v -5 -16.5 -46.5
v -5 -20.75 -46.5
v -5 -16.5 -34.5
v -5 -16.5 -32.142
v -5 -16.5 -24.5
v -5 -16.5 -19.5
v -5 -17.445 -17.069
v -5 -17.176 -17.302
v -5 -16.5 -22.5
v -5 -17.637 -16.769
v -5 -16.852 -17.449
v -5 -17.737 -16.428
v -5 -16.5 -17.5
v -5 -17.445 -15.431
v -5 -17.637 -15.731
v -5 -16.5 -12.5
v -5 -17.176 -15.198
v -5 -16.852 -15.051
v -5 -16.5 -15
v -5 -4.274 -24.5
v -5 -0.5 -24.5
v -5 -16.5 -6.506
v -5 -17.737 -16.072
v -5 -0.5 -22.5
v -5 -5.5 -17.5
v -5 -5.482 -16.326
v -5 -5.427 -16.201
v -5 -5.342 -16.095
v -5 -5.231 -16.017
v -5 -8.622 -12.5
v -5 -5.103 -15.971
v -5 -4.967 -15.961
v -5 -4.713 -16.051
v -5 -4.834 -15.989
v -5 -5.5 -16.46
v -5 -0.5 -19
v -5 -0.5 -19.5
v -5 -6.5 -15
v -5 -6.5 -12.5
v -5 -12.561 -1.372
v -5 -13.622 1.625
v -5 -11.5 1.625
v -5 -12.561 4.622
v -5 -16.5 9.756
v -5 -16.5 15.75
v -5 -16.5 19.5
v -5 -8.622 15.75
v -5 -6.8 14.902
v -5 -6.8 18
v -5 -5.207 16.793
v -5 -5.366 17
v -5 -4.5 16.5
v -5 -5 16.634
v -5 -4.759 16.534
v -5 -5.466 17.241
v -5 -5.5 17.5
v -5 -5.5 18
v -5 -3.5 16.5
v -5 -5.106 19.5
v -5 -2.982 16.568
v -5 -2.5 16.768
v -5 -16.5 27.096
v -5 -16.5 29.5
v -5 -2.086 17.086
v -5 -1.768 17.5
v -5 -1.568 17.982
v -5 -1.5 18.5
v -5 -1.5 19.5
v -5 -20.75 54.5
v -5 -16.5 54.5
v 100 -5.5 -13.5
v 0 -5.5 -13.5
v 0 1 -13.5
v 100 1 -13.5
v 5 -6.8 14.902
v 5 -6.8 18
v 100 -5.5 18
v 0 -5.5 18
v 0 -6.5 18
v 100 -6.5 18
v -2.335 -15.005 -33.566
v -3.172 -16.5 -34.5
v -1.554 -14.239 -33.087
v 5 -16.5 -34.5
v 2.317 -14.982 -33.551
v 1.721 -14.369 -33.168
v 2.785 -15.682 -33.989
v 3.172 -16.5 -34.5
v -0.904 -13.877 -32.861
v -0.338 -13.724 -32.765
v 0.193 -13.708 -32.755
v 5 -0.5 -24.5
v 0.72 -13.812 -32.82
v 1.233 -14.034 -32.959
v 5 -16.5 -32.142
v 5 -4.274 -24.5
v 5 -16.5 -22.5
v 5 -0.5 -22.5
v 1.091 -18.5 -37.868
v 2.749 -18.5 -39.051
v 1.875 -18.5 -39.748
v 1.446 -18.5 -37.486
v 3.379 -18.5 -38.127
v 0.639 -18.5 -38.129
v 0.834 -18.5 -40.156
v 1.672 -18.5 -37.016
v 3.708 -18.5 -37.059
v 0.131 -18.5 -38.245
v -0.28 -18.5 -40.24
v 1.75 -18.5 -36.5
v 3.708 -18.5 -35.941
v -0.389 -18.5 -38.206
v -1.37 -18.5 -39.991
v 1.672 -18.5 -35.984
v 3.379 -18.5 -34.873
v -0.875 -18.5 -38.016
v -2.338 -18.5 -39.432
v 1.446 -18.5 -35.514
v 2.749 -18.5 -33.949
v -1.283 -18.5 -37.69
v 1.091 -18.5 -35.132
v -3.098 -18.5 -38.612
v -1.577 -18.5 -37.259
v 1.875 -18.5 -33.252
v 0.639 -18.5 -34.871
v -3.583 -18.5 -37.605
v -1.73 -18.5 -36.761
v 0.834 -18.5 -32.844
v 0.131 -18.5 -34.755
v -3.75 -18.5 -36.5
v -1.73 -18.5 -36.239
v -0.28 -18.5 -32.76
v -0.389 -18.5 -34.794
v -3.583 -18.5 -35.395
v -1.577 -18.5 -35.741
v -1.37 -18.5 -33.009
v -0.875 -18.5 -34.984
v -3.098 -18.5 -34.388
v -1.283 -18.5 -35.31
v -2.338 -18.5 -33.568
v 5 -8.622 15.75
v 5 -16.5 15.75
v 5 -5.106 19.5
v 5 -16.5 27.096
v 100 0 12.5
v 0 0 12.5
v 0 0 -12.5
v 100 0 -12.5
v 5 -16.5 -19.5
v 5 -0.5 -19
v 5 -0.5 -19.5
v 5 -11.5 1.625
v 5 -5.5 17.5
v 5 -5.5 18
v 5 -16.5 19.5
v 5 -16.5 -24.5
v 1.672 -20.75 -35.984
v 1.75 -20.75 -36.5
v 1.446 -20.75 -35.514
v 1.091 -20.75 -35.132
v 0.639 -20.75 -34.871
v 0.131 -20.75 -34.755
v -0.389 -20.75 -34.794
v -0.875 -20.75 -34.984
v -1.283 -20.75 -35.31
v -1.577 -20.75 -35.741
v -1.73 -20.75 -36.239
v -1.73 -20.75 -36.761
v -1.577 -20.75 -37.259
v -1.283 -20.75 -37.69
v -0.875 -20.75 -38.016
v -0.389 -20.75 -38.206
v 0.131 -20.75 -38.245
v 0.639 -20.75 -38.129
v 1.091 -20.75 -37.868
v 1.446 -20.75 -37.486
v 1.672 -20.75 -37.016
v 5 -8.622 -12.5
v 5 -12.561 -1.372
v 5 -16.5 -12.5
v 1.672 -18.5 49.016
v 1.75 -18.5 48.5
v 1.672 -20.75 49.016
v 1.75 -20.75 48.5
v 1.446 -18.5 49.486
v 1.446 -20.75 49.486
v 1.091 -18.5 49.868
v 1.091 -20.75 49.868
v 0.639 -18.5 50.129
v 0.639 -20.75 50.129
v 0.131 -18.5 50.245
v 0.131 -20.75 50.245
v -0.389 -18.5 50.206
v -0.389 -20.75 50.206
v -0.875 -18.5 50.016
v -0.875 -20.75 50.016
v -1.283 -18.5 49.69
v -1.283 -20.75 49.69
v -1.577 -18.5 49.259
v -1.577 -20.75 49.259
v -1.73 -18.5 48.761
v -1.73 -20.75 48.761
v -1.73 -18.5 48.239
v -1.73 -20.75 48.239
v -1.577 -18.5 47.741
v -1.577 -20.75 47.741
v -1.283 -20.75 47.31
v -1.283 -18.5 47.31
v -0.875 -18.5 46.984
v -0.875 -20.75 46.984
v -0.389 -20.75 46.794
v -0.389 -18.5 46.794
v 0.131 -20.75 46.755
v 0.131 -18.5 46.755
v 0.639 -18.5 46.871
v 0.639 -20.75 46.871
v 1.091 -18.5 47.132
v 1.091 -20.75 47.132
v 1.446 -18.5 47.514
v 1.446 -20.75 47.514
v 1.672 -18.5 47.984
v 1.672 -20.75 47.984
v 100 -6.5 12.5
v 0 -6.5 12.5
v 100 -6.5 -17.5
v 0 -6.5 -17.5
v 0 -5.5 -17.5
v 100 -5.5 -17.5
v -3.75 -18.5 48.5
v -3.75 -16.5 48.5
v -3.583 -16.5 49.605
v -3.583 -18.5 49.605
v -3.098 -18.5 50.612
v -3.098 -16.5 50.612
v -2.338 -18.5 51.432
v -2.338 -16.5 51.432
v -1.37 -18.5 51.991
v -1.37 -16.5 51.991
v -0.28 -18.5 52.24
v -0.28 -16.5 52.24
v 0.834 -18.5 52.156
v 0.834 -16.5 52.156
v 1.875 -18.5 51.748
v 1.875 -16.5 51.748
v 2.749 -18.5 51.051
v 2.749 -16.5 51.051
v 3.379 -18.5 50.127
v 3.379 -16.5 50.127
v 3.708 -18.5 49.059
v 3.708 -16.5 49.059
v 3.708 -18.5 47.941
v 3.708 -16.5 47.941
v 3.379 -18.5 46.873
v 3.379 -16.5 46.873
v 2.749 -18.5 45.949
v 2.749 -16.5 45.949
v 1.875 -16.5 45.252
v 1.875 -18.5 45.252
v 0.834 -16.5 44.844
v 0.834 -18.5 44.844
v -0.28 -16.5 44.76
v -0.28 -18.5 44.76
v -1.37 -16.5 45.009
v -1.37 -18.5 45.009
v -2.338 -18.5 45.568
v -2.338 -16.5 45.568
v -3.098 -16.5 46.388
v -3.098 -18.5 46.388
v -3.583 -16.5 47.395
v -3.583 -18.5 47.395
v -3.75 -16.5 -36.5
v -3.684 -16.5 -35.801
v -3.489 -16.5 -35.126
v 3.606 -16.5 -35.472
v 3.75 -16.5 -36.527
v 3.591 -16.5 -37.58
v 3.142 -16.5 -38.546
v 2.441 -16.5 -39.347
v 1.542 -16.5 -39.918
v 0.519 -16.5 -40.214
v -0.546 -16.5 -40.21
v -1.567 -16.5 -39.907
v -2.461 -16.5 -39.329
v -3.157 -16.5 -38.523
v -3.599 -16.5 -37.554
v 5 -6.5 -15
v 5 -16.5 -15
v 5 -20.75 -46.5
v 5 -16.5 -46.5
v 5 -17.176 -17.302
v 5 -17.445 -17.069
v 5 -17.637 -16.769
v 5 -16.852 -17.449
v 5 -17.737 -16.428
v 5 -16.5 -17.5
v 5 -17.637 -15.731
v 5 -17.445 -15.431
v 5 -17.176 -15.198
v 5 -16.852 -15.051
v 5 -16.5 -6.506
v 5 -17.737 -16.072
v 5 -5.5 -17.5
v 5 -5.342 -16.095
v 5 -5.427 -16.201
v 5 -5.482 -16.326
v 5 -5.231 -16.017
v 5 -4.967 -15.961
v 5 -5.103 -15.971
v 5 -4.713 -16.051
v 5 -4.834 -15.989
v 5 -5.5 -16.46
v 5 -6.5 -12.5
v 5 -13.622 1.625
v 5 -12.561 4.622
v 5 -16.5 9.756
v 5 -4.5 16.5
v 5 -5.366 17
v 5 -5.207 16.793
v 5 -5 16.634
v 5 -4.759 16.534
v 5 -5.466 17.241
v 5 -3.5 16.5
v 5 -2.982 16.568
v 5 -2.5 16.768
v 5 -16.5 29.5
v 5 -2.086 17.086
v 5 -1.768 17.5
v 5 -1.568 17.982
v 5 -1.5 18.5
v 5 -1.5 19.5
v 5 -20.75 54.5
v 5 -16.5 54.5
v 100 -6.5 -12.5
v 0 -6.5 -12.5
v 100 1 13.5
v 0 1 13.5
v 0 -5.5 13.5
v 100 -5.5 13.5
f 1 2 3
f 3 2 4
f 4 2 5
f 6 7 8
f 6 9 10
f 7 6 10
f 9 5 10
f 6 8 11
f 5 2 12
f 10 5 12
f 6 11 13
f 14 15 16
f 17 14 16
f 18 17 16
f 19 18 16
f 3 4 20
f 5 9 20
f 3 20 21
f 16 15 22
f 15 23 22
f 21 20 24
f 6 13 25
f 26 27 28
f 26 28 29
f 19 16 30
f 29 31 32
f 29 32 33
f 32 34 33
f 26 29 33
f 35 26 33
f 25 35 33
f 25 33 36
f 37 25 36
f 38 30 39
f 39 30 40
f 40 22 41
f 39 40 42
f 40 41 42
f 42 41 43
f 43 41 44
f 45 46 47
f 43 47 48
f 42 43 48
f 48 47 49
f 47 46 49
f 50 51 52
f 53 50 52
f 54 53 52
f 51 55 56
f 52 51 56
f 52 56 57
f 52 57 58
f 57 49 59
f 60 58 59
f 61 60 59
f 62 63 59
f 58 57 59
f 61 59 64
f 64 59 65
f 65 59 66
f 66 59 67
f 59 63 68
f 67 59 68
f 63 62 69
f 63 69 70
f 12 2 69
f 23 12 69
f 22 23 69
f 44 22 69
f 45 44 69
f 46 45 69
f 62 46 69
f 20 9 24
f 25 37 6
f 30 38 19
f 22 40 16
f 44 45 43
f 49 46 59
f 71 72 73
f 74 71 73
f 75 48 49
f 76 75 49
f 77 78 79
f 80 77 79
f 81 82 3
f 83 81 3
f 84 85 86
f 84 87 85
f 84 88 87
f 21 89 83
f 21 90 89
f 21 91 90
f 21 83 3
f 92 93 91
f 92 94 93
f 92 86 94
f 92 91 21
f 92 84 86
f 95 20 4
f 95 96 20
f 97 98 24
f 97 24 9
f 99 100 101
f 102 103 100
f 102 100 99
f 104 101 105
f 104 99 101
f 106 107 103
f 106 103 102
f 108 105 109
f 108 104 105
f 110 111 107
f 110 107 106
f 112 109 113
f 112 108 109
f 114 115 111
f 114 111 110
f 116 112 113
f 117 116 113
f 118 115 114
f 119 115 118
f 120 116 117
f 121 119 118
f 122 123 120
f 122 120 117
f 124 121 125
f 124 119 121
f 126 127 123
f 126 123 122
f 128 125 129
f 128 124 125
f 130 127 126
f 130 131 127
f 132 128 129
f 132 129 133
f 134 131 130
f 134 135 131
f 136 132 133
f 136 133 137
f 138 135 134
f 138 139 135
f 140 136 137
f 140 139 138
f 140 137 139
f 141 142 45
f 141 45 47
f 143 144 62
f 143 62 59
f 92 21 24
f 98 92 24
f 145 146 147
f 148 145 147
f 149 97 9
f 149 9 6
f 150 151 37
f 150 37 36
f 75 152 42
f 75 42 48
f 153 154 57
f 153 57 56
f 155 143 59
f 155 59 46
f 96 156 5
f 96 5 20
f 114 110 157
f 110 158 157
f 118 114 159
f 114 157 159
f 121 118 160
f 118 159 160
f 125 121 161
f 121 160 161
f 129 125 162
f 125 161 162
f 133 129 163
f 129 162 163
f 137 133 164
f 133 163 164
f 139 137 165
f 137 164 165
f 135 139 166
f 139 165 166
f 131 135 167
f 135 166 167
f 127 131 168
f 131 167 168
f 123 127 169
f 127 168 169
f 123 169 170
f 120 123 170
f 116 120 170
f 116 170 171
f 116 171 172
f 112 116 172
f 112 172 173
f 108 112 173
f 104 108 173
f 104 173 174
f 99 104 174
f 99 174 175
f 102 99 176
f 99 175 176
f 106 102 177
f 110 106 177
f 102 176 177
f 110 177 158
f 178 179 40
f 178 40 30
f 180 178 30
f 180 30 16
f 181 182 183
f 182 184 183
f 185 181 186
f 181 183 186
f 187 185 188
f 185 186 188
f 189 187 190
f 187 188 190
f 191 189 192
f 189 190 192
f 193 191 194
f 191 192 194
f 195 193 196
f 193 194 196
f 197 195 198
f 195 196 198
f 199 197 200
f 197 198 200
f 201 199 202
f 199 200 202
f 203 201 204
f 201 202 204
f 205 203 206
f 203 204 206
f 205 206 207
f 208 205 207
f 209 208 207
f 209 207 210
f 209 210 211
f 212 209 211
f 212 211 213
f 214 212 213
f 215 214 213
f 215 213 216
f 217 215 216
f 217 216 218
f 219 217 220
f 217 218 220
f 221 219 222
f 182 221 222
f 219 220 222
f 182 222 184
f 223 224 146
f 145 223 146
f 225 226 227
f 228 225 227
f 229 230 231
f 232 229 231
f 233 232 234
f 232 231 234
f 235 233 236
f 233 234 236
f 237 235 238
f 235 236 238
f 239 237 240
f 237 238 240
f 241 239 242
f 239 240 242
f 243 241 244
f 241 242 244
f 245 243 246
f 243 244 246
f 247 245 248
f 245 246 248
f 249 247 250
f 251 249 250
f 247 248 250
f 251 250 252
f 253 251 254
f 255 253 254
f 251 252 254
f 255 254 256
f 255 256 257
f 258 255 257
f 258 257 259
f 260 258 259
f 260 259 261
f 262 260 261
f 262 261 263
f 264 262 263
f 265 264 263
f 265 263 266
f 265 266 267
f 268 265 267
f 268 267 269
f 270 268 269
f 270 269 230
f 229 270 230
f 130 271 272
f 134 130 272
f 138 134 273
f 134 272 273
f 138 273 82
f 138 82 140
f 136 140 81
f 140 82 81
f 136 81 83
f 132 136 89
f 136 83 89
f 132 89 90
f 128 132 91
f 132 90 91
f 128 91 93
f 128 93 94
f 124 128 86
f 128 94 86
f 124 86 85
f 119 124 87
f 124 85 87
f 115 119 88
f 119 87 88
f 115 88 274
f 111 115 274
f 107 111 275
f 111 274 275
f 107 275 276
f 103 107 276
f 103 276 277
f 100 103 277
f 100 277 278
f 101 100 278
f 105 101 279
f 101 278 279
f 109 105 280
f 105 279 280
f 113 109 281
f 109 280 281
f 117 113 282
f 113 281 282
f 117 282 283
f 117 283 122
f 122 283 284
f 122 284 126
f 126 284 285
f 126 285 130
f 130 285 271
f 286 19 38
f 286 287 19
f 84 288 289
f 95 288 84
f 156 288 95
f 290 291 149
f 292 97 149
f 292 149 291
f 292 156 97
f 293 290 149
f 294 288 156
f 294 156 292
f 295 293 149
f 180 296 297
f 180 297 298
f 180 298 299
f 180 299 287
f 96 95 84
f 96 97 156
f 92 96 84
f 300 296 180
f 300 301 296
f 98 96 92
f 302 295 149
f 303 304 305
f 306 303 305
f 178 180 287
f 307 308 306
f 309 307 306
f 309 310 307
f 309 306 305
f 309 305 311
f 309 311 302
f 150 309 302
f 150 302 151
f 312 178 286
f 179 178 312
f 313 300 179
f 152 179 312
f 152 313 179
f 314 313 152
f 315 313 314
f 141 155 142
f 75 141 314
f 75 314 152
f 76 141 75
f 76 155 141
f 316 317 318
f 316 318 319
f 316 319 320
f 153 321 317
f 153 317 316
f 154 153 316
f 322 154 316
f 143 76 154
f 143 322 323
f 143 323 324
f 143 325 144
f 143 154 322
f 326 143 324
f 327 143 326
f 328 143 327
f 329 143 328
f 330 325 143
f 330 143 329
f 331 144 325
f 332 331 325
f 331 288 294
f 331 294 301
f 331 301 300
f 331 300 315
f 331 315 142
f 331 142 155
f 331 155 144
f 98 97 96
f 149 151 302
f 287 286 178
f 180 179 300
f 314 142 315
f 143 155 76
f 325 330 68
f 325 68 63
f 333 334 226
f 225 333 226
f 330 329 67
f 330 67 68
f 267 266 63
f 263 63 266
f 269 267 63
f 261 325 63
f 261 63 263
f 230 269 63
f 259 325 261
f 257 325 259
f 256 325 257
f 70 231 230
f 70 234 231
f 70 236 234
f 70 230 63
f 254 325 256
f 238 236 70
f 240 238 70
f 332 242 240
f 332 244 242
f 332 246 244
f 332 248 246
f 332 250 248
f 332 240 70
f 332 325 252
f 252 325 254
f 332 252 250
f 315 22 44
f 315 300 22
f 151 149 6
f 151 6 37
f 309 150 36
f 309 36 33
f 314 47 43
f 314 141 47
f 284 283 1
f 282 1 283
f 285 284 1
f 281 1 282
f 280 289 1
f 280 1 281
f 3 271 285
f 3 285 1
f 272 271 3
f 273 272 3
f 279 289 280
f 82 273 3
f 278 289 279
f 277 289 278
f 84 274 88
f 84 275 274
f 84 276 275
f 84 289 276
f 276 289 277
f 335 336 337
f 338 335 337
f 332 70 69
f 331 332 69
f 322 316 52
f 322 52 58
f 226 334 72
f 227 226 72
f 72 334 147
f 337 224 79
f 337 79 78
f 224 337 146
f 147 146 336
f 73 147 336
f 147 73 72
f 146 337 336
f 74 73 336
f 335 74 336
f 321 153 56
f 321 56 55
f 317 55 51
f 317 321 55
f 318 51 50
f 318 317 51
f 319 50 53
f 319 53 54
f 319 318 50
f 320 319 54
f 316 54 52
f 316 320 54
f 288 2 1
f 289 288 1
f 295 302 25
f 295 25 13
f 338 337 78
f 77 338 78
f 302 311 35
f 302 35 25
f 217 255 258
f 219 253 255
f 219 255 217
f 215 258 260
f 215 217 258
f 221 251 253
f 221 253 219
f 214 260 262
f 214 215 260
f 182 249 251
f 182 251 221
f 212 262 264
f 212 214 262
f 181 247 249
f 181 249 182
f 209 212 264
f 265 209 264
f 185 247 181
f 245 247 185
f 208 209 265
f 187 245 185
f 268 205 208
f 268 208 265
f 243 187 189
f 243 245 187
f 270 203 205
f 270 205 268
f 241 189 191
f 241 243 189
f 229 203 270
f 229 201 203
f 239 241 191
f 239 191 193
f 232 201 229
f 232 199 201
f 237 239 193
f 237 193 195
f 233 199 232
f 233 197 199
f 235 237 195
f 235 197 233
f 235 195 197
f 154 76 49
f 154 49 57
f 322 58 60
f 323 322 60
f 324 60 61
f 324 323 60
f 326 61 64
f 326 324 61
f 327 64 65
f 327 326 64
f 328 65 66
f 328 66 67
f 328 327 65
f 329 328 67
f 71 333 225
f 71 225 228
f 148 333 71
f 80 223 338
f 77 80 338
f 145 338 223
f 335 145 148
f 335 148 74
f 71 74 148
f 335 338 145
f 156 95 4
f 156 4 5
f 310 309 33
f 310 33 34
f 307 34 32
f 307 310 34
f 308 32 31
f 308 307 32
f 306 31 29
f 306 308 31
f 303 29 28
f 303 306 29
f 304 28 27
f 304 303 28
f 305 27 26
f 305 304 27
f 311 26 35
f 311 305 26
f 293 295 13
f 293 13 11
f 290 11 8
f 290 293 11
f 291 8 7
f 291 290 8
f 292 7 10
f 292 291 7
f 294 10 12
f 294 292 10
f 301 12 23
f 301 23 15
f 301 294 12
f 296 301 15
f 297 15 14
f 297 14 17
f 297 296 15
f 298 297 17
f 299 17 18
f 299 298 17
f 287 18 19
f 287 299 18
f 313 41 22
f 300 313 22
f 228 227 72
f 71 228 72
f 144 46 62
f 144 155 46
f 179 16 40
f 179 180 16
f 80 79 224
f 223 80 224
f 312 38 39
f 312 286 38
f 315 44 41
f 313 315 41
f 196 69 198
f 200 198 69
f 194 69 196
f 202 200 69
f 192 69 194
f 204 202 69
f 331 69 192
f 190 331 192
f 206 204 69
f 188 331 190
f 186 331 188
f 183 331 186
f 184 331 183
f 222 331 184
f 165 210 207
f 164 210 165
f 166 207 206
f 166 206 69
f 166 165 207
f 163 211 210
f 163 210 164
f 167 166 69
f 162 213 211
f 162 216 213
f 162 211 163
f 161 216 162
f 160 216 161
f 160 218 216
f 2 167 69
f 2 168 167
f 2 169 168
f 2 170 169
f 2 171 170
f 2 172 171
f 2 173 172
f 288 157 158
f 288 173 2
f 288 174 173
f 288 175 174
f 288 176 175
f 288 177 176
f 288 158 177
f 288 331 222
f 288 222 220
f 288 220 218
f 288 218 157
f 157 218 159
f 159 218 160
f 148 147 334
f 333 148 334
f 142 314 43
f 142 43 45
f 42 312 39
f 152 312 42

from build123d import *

# Parameters (mm, degrees)
F1_DEPTH       = 100
F2_W           = 4.25
F2_H           = 12
F3_DEPTH       = 5
F5_D           = 3.5
F5_CBORE_D     = 7.5
F5_CBORE_DEPTH = 17


# Not quite as in the source:
# - a feature names something its author has since deleted; it is built from what else it names


with BuildPart() as f1:
    # F0 (on Right) → F1 (new body)
    with BuildSketch(Plane.YZ):
        Polygon((-5.5, 18), (-6.5, 18), (-6.5, 12.5), (0, 12.5), (0, -12.5), (-6.5, -12.5), (-6.5, -17.5), (-5.5, -17.5), (-5.5, -13.5), (1, -13.5), (1, 13.5), (-5.5, 13.5), align=None)
    extrude(amount=F1_DEPTH)


with BuildPart() as f3:
    # F2 (on Right) → F3 (new body, symmetric)
    with BuildSketch(Plane.YZ):
        with BuildLine():
            ThreePointArc((-3.5, 16.5), (-2.0857864376, 17.0857864376), (-1.5, 18.5))
            Line((-1.5, 18.5), (-1.5, 19.5))
            Line((-1.5, 19.5), (-5.1055512755, 19.5))
            Line((-5.1055512755, 19.5), (-16.5, 19.5))
            Line((-16.5, 19.5), (-20.75, 19.5))
            Line((-20.75, 19.5), (-20.75, -19.5))
            Line((-20.75, -19.5), (-16.5, -19.5))
            Line((-16.5, -19.5), (-0.5, -19.5))
            Line((-0.5, -19.5), (-0.5, -19))
            Line((-0.5, -19), (-4.7132688278, -16.0507118205))
            ThreePointArc((-4.7132688278, -16.0507118205), (-5.2309051904, -16.0168384426), (-5.5, -16.4603277808))
            Line((-5.5, -16.4603277808), (-5.5, -17.5))
            Line((-5.5, -17.5), (-16.5, -17.5))
            ThreePointArc((-16.5, -17.5), (-17.75, -16.25), (-16.5, -15))
            Line((-16.5, -15), (-6.5, -15))
            Line((-6.5, -15), (-6.5, -12.5))
            Line((-6.5, -12.5), (-11.5, 1.625))
            Line((-11.5, 1.625), (-6.8, 14.9025))
            Line((-6.8, 14.9025), (-6.8, 18))
            Line((-6.8, 18), (-6.5, 18))
            Line((-6.5, 18), (-5.5, 18))
            Line((-5.5, 18), (-5.5, 17.5))
            ThreePointArc((-5.5, 17.5), (-5.2071067812, 16.7928932188), (-4.5, 16.5))
            Line((-4.5, 16.5), (-3.5, 16.5))
        make_face()
        Polygon((-16.5, -12.5), (-12.560803219, -1.3717690935), (-8.6216064379, -12.5), align=None, mode=Mode.SUBTRACT)
        Polygon((-12.560803219, 4.6217690935), (-11.5, 1.625), (-12.560803219, -1.3717690935), (-12.6095014243, -1.2341966635), (-13.6216064379, 1.625), (-16.5, -6.5064618129), (-16.5, 9.7564618129), (-16.5, 15.75), (-8.6216064379, 15.75), align=None, mode=Mode.SUBTRACT)
        Polygon((-16.5, -19.5), (-20.75, -19.5), (-20.75, -34.5), (-16.5, -34.5), (-0.5, -24.5), (-0.5, -22.5), (-16.5, -22.5), align=None)
        Polygon((-16.5, -32.141504717), (-16.5, -24.5), (-4.2735924528, -24.5), align=None, mode=Mode.SUBTRACT)
        Polygon((-16.5, 27.0962991497), (-16.5, 29.5), (-16.5, 54.5), (-20.75, 54.5), (-20.75, 19.5), (-16.5, 19.5), align=None)
        with Locations((-18.625, -40.5)):
            Rectangle(F2_W, F2_H)
        Polygon((-5.1055512755, 19.5), (-1.5, 19.5), (-16.5, 29.5), (-16.5, 27.0962991497), align=None)
        Polygon((-12.560803219, -1.3717690935), (-11.5, 1.625), (-12.560803219, 4.6217690935), (-16.5, 15.75), (-16.5, 9.7564618129), (-13.6216064379, 1.625), (-12.6095014243, -1.2341966635), align=None)
    extrude(amount=F3_DEPTH, both=True)

    # F5 (through all)
    with Locations(Plane(origin=(0, -1.5, 0), x_dir=(-1, 0, 0), z_dir=(0, 1, 0))):
        with Locations((0, 48.5), (0, -36.5)):
            CounterBoreHole(F5_D / 2, F5_CBORE_D / 2, F5_CBORE_DEPTH)


solid = Compound([f1.part, f3.part])
